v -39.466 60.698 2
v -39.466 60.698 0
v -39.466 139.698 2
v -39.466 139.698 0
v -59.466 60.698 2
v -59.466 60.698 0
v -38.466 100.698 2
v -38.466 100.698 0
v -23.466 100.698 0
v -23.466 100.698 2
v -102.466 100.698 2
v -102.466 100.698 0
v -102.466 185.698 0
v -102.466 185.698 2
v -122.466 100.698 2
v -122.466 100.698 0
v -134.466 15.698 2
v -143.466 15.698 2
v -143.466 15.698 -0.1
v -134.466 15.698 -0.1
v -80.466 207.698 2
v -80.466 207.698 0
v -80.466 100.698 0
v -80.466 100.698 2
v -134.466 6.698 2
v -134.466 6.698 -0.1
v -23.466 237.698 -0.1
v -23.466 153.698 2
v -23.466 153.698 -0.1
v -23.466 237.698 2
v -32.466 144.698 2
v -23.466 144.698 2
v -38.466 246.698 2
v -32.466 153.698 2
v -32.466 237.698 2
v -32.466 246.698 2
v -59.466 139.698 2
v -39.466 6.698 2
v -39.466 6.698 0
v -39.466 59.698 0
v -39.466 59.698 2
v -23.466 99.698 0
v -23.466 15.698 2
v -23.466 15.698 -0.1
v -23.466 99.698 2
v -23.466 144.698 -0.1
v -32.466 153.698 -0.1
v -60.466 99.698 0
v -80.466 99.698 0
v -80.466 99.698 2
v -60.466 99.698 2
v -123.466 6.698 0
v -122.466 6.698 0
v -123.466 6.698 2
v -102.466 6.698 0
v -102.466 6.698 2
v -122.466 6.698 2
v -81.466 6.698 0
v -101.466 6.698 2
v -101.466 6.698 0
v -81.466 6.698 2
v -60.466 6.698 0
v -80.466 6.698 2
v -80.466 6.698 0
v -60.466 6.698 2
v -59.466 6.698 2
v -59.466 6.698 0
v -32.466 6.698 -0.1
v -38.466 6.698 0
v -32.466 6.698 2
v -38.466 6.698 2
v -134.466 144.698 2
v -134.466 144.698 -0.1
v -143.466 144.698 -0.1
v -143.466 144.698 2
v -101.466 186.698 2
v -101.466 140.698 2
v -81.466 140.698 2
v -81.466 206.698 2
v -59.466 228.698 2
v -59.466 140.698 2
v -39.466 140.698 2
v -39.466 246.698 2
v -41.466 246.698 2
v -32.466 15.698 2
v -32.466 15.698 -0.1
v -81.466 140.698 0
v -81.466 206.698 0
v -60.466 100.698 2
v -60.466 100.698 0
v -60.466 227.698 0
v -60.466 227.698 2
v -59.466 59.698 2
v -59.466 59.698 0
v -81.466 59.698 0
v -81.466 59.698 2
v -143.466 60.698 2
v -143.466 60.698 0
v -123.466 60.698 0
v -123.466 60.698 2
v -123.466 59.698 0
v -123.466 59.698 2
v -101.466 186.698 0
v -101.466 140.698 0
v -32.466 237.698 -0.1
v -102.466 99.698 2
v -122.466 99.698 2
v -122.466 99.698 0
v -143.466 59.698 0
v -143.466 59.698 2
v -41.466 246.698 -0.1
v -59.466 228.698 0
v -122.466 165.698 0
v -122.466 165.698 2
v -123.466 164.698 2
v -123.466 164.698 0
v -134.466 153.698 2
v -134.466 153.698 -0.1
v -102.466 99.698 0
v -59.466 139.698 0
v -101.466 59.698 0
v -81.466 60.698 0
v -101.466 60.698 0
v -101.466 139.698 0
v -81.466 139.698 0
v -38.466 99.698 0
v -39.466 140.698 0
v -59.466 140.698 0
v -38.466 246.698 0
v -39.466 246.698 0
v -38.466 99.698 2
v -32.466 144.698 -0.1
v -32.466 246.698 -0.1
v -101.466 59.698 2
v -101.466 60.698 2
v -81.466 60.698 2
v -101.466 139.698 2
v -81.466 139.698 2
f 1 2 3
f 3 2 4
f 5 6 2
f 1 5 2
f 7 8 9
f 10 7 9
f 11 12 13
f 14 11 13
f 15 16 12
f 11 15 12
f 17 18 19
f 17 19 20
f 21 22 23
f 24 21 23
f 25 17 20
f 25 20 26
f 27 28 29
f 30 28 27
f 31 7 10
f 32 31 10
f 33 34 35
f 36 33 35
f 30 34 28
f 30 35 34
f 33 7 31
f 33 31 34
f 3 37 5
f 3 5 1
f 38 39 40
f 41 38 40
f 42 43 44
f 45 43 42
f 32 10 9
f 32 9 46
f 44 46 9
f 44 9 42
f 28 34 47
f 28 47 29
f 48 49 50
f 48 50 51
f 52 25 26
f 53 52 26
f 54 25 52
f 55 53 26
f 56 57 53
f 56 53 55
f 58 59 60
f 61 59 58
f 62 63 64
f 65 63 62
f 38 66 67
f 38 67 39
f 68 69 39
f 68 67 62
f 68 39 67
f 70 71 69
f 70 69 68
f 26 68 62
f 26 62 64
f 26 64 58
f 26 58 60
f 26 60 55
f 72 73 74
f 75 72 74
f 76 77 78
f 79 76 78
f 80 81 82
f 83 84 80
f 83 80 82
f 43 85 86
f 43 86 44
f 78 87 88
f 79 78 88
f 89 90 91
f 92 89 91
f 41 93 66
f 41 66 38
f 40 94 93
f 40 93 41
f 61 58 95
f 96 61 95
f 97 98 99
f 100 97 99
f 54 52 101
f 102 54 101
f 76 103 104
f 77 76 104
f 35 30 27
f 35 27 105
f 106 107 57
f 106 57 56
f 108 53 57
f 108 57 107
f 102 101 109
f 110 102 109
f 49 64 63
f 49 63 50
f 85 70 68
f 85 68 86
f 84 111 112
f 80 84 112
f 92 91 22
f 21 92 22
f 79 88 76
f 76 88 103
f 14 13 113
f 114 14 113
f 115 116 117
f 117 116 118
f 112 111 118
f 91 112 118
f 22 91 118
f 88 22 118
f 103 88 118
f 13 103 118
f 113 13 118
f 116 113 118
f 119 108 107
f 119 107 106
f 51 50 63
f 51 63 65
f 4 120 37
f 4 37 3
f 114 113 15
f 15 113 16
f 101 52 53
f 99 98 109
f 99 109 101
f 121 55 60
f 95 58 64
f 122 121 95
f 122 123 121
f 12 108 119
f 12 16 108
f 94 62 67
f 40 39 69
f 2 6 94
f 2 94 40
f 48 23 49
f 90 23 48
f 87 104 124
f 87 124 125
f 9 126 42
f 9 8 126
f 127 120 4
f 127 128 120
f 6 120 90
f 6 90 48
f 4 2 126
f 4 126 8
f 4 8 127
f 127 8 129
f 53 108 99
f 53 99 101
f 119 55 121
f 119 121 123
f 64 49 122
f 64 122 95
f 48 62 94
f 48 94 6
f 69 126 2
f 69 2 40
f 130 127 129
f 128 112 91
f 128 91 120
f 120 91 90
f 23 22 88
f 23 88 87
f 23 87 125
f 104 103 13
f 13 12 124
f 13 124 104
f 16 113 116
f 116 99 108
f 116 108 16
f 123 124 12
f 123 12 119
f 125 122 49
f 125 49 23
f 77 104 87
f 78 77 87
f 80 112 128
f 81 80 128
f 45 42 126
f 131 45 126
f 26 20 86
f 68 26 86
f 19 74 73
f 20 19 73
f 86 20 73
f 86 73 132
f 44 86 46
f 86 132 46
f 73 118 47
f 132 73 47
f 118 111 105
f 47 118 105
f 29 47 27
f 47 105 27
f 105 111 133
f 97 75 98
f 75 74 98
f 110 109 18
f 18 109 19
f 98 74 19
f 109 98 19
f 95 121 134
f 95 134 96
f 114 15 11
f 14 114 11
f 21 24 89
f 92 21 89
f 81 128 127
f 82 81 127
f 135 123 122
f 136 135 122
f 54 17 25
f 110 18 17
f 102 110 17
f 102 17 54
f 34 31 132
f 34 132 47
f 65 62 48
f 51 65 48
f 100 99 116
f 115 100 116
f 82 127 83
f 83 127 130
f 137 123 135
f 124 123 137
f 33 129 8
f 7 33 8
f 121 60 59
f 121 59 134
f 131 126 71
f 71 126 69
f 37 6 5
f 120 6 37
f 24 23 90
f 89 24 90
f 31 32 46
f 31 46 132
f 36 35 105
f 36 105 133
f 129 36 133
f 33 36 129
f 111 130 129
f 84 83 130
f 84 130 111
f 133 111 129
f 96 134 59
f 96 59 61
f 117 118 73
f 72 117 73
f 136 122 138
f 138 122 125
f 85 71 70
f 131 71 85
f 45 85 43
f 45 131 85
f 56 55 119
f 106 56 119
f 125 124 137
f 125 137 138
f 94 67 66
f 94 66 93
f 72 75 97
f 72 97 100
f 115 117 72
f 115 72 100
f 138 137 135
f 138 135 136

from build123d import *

# Parameters (mm, degrees)
F0_W     = 20
F0_H     = 93
F0_H_2   = 79
F0_H_3   = 53
F0_H_4   = 1
F0_W_2   = 15
F0_W_3   = 2
F0_H_5   = 9
F0_W_4   = 1
F0_W_5   = 6
F1_DEPTH = 0.1
F2_DEPTH = 2


# Not quite as in the source:
# - a feature names something its author has since deleted; it is built from what else it names


with BuildPart() as f1:
    # F0 (on Top) → F1 (new body)
    with BuildSketch(Plane.XY):
        Polygon((-134.4656153619, 144.6975417137), (-143.4656153619, 144.6975417137), (-143.4656153619, 104.6975417137), (-143.4656153619, 95.6975417137), (-143.4656153619, 64.6975417137), (-143.4656153619, 60.6975417137), (-123.4656153619, 60.6975417137), (-123.4656153619, 164.6975417137), (-134.4656153619, 153.6975417137), align=None)
        Polygon((-123.4656153619, 6.6975417137), (-123.4656153619, 59.6975417137), (-143.4656153619, 59.6975417137), (-143.4656153619, 55.6975417137), (-143.4656153619, 15.6975417137), (-134.4656153619, 15.6975417137), (-134.4656153619, 6.6975417137), align=None)
        with Locations((-112.4656153619, 53.1975417137)):
            Rectangle(F0_W, F0_H)
        Polygon((-102.4656153619, 185.6975417137), (-122.4656153619, 165.6975417137), (-122.4656153619, 100.6975417137), (-102.4656153619, 100.6975417137), align=None)
        Polygon((-81.4656153619, 140.6975417137), (-81.4656153619, 206.6975417137), (-101.4656153619, 186.6975417137), (-101.4656153619, 140.6975417137), align=None)
        with Locations((-91.4656153619, 100.1975417137)):
            Rectangle(F0_W, F0_H_2)
        with Locations((-91.4656153619, 33.1975417137)):
            Rectangle(F0_W, F0_H_3)
        Polygon((-60.4656153619, 100.6975417137), (-60.4656153619, 227.6975417137), (-80.4656153619, 207.6975417137), (-80.4656153619, 100.6975417137), align=None)
        with Locations((-70.4656153619, 53.1975417137)):
            Rectangle(F0_W, F0_H)
        Polygon((-41.4656153619, 237.6975417137), (-41.4656153619, 246.6975417137), (-59.4656153619, 228.6975417137), (-59.4656153619, 140.6975417137), (-39.4656153619, 140.6975417137), (-39.4656153619, 237.6975417137), align=None)
        with Locations((-49.4656153619, 100.1975417137)):
            Rectangle(F0_W, F0_H_2)
        with Locations((-49.4656153619, 33.1975417137)):
            Rectangle(F0_W, F0_H_3)
        with Locations((-133.4656153619, 60.1975417137)):
            Rectangle(F0_W, F0_H_4)
        Polygon((-122.4656153619, 165.6975417137), (-123.4656153619, 164.6975417137), (-123.4656153619, 60.6975417137), (-123.4656153619, 59.6975417137), (-123.4656153619, 6.6975417137), (-122.4656153619, 6.6975417137), (-122.4656153619, 99.6975417137), (-122.4656153619, 100.6975417137), align=None)
        with Locations((-112.4656153619, 100.1975417137)):
            Rectangle(F0_W, F0_H_4)
        Polygon((-101.4656153619, 186.6975417137), (-102.4656153619, 185.6975417137), (-102.4656153619, 100.6975417137), (-102.4656153619, 99.6975417137), (-102.4656153619, 6.6975417137), (-101.4656153619, 6.6975417137), (-101.4656153619, 59.6975417137), (-101.4656153619, 60.6975417137), (-101.4656153619, 139.6975417137), (-101.4656153619, 140.6975417137), align=None)
        with Locations((-91.4656153619, 140.1975417137)):
            Rectangle(F0_W, F0_H_4)
        Polygon((-80.4656153619, 100.6975417137), (-80.4656153619, 207.6975417137), (-81.4656153619, 206.6975417137), (-81.4656153619, 140.6975417137), (-81.4656153619, 139.6975417137), (-81.4656153619, 60.6975417137), (-81.4656153619, 59.6975417137), (-81.4656153619, 6.6975417137), (-80.4656153619, 6.6975417137), (-80.4656153619, 99.6975417137), align=None)
        with Locations((-70.4656153619, 100.1975417137)):
            Rectangle(F0_W, F0_H_4)
        Polygon((-59.4656153619, 140.6975417137), (-59.4656153619, 228.6975417137), (-60.4656153619, 227.6975417137), (-60.4656153619, 100.6975417137), (-60.4656153619, 99.6975417137), (-60.4656153619, 6.6975417137), (-59.4656153619, 6.6975417137), (-59.4656153619, 59.6975417137), (-59.4656153619, 60.6975417137), (-59.4656153619, 139.6975417137), align=None)
        with Locations((-49.4656153619, 60.1975417137)):
            Rectangle(F0_W, F0_H_4)
        with Locations((-49.4656153619, 140.1975417137)):
            Rectangle(F0_W, F0_H_4)
        with Locations((-91.4656153619, 60.1975417137)):
            Rectangle(F0_W, F0_H_4)
        Polygon((-38.4656153619, 237.6975417137), (-39.4656153619, 237.6975417137), (-39.4656153619, 140.6975417137), (-39.4656153619, 139.6975417137), (-39.4656153619, 60.6975417137), (-39.4656153619, 59.6975417137), (-39.4656153619, 6.6975417137), (-38.4656153619, 6.6975417137), (-38.4656153619, 99.6975417137), (-38.4656153619, 100.6975417137), align=None)
        Polygon((-23.4656153619, 99.6975417137), (-38.4656153619, 99.6975417137), (-38.4656153619, 6.6975417137), (-32.4656153619, 6.6975417137), (-32.4656153619, 15.6975417137), (-23.4656153619, 15.6975417137), align=None)
        Polygon((-32.4656153619, 237.6975417137), (-38.4656153619, 237.6975417137), (-38.4656153619, 100.6975417137), (-23.4656153619, 100.6975417137), (-23.4656153619, 144.6975417137), (-32.4656153619, 144.6975417137), (-32.4656153619, 153.6975417137), (-23.4656153619, 153.6975417137), (-23.4656153619, 237.6975417137), align=None)
        with Locations((-30.9656153619, 100.1975417137)):
            Rectangle(F0_W_2, F0_H_4)
        with Locations((-40.4656153619, 242.1975417137)):
            Rectangle(F0_W_3, F0_H_5)
        with Locations((-38.9656153619, 242.1975417137)):
            Rectangle(F0_W_4, F0_H_5)
        with Locations((-35.4656153619, 242.1975417137)):
            Rectangle(F0_W_5, F0_H_5)
    extrude(amount=-F1_DEPTH)

    # F0 (on Top) → F2 (join)
    with BuildSketch(Plane.XY):
        Polygon((-134.4656153619, 144.6975417137), (-143.4656153619, 144.6975417137), (-143.4656153619, 104.6975417137), (-143.4656153619, 95.6975417137), (-143.4656153619, 64.6975417137), (-143.4656153619, 60.6975417137), (-123.4656153619, 60.6975417137), (-123.4656153619, 164.6975417137), (-134.4656153619, 153.6975417137), align=None)
        Polygon((-123.4656153619, 6.6975417137), (-123.4656153619, 59.6975417137), (-143.4656153619, 59.6975417137), (-143.4656153619, 55.6975417137), (-143.4656153619, 15.6975417137), (-134.4656153619, 15.6975417137), (-134.4656153619, 6.6975417137), align=None)
        with Locations((-112.4656153619, 53.1975417137)):
            Rectangle(F0_W, F0_H)
        Polygon((-102.4656153619, 185.6975417137), (-122.4656153619, 165.6975417137), (-122.4656153619, 100.6975417137), (-102.4656153619, 100.6975417137), align=None)
        Polygon((-81.4656153619, 140.6975417137), (-81.4656153619, 206.6975417137), (-101.4656153619, 186.6975417137), (-101.4656153619, 140.6975417137), align=None)
        with Locations((-91.4656153619, 100.1975417137)):
            Rectangle(F0_W, F0_H_2)
        with Locations((-91.4656153619, 33.1975417137)):
            Rectangle(F0_W, F0_H_3)
        with Locations((-70.4656153619, 53.1975417137)):
            Rectangle(F0_W, F0_H)
        Polygon((-60.4656153619, 100.6975417137), (-60.4656153619, 227.6975417137), (-80.4656153619, 207.6975417137), (-80.4656153619, 100.6975417137), align=None)
        Polygon((-41.4656153619, 237.6975417137), (-41.4656153619, 246.6975417137), (-59.4656153619, 228.6975417137), (-59.4656153619, 140.6975417137), (-39.4656153619, 140.6975417137), (-39.4656153619, 237.6975417137), align=None)
        with Locations((-49.4656153619, 100.1975417137)):
            Rectangle(F0_W, F0_H_2)
        with Locations((-49.4656153619, 33.1975417137)):
            Rectangle(F0_W, F0_H_3)
        Polygon((-23.4656153619, 99.6975417137), (-38.4656153619, 99.6975417137), (-38.4656153619, 6.6975417137), (-32.4656153619, 6.6975417137), (-32.4656153619, 15.6975417137), (-23.4656153619, 15.6975417137), align=None)
        Polygon((-32.4656153619, 237.6975417137), (-38.4656153619, 237.6975417137), (-38.4656153619, 100.6975417137), (-23.4656153619, 100.6975417137), (-23.4656153619, 144.6975417137), (-32.4656153619, 144.6975417137), (-32.4656153619, 153.6975417137), (-23.4656153619, 153.6975417137), (-23.4656153619, 237.6975417137), align=None)
        with Locations((-40.4656153619, 242.1975417137)):
            Rectangle(F0_W_3, F0_H_5)
        with Locations((-35.4656153619, 242.1975417137)):
            Rectangle(F0_W_5, F0_H_5)
    extrude(amount=F2_DEPTH)


solid = f1.part
